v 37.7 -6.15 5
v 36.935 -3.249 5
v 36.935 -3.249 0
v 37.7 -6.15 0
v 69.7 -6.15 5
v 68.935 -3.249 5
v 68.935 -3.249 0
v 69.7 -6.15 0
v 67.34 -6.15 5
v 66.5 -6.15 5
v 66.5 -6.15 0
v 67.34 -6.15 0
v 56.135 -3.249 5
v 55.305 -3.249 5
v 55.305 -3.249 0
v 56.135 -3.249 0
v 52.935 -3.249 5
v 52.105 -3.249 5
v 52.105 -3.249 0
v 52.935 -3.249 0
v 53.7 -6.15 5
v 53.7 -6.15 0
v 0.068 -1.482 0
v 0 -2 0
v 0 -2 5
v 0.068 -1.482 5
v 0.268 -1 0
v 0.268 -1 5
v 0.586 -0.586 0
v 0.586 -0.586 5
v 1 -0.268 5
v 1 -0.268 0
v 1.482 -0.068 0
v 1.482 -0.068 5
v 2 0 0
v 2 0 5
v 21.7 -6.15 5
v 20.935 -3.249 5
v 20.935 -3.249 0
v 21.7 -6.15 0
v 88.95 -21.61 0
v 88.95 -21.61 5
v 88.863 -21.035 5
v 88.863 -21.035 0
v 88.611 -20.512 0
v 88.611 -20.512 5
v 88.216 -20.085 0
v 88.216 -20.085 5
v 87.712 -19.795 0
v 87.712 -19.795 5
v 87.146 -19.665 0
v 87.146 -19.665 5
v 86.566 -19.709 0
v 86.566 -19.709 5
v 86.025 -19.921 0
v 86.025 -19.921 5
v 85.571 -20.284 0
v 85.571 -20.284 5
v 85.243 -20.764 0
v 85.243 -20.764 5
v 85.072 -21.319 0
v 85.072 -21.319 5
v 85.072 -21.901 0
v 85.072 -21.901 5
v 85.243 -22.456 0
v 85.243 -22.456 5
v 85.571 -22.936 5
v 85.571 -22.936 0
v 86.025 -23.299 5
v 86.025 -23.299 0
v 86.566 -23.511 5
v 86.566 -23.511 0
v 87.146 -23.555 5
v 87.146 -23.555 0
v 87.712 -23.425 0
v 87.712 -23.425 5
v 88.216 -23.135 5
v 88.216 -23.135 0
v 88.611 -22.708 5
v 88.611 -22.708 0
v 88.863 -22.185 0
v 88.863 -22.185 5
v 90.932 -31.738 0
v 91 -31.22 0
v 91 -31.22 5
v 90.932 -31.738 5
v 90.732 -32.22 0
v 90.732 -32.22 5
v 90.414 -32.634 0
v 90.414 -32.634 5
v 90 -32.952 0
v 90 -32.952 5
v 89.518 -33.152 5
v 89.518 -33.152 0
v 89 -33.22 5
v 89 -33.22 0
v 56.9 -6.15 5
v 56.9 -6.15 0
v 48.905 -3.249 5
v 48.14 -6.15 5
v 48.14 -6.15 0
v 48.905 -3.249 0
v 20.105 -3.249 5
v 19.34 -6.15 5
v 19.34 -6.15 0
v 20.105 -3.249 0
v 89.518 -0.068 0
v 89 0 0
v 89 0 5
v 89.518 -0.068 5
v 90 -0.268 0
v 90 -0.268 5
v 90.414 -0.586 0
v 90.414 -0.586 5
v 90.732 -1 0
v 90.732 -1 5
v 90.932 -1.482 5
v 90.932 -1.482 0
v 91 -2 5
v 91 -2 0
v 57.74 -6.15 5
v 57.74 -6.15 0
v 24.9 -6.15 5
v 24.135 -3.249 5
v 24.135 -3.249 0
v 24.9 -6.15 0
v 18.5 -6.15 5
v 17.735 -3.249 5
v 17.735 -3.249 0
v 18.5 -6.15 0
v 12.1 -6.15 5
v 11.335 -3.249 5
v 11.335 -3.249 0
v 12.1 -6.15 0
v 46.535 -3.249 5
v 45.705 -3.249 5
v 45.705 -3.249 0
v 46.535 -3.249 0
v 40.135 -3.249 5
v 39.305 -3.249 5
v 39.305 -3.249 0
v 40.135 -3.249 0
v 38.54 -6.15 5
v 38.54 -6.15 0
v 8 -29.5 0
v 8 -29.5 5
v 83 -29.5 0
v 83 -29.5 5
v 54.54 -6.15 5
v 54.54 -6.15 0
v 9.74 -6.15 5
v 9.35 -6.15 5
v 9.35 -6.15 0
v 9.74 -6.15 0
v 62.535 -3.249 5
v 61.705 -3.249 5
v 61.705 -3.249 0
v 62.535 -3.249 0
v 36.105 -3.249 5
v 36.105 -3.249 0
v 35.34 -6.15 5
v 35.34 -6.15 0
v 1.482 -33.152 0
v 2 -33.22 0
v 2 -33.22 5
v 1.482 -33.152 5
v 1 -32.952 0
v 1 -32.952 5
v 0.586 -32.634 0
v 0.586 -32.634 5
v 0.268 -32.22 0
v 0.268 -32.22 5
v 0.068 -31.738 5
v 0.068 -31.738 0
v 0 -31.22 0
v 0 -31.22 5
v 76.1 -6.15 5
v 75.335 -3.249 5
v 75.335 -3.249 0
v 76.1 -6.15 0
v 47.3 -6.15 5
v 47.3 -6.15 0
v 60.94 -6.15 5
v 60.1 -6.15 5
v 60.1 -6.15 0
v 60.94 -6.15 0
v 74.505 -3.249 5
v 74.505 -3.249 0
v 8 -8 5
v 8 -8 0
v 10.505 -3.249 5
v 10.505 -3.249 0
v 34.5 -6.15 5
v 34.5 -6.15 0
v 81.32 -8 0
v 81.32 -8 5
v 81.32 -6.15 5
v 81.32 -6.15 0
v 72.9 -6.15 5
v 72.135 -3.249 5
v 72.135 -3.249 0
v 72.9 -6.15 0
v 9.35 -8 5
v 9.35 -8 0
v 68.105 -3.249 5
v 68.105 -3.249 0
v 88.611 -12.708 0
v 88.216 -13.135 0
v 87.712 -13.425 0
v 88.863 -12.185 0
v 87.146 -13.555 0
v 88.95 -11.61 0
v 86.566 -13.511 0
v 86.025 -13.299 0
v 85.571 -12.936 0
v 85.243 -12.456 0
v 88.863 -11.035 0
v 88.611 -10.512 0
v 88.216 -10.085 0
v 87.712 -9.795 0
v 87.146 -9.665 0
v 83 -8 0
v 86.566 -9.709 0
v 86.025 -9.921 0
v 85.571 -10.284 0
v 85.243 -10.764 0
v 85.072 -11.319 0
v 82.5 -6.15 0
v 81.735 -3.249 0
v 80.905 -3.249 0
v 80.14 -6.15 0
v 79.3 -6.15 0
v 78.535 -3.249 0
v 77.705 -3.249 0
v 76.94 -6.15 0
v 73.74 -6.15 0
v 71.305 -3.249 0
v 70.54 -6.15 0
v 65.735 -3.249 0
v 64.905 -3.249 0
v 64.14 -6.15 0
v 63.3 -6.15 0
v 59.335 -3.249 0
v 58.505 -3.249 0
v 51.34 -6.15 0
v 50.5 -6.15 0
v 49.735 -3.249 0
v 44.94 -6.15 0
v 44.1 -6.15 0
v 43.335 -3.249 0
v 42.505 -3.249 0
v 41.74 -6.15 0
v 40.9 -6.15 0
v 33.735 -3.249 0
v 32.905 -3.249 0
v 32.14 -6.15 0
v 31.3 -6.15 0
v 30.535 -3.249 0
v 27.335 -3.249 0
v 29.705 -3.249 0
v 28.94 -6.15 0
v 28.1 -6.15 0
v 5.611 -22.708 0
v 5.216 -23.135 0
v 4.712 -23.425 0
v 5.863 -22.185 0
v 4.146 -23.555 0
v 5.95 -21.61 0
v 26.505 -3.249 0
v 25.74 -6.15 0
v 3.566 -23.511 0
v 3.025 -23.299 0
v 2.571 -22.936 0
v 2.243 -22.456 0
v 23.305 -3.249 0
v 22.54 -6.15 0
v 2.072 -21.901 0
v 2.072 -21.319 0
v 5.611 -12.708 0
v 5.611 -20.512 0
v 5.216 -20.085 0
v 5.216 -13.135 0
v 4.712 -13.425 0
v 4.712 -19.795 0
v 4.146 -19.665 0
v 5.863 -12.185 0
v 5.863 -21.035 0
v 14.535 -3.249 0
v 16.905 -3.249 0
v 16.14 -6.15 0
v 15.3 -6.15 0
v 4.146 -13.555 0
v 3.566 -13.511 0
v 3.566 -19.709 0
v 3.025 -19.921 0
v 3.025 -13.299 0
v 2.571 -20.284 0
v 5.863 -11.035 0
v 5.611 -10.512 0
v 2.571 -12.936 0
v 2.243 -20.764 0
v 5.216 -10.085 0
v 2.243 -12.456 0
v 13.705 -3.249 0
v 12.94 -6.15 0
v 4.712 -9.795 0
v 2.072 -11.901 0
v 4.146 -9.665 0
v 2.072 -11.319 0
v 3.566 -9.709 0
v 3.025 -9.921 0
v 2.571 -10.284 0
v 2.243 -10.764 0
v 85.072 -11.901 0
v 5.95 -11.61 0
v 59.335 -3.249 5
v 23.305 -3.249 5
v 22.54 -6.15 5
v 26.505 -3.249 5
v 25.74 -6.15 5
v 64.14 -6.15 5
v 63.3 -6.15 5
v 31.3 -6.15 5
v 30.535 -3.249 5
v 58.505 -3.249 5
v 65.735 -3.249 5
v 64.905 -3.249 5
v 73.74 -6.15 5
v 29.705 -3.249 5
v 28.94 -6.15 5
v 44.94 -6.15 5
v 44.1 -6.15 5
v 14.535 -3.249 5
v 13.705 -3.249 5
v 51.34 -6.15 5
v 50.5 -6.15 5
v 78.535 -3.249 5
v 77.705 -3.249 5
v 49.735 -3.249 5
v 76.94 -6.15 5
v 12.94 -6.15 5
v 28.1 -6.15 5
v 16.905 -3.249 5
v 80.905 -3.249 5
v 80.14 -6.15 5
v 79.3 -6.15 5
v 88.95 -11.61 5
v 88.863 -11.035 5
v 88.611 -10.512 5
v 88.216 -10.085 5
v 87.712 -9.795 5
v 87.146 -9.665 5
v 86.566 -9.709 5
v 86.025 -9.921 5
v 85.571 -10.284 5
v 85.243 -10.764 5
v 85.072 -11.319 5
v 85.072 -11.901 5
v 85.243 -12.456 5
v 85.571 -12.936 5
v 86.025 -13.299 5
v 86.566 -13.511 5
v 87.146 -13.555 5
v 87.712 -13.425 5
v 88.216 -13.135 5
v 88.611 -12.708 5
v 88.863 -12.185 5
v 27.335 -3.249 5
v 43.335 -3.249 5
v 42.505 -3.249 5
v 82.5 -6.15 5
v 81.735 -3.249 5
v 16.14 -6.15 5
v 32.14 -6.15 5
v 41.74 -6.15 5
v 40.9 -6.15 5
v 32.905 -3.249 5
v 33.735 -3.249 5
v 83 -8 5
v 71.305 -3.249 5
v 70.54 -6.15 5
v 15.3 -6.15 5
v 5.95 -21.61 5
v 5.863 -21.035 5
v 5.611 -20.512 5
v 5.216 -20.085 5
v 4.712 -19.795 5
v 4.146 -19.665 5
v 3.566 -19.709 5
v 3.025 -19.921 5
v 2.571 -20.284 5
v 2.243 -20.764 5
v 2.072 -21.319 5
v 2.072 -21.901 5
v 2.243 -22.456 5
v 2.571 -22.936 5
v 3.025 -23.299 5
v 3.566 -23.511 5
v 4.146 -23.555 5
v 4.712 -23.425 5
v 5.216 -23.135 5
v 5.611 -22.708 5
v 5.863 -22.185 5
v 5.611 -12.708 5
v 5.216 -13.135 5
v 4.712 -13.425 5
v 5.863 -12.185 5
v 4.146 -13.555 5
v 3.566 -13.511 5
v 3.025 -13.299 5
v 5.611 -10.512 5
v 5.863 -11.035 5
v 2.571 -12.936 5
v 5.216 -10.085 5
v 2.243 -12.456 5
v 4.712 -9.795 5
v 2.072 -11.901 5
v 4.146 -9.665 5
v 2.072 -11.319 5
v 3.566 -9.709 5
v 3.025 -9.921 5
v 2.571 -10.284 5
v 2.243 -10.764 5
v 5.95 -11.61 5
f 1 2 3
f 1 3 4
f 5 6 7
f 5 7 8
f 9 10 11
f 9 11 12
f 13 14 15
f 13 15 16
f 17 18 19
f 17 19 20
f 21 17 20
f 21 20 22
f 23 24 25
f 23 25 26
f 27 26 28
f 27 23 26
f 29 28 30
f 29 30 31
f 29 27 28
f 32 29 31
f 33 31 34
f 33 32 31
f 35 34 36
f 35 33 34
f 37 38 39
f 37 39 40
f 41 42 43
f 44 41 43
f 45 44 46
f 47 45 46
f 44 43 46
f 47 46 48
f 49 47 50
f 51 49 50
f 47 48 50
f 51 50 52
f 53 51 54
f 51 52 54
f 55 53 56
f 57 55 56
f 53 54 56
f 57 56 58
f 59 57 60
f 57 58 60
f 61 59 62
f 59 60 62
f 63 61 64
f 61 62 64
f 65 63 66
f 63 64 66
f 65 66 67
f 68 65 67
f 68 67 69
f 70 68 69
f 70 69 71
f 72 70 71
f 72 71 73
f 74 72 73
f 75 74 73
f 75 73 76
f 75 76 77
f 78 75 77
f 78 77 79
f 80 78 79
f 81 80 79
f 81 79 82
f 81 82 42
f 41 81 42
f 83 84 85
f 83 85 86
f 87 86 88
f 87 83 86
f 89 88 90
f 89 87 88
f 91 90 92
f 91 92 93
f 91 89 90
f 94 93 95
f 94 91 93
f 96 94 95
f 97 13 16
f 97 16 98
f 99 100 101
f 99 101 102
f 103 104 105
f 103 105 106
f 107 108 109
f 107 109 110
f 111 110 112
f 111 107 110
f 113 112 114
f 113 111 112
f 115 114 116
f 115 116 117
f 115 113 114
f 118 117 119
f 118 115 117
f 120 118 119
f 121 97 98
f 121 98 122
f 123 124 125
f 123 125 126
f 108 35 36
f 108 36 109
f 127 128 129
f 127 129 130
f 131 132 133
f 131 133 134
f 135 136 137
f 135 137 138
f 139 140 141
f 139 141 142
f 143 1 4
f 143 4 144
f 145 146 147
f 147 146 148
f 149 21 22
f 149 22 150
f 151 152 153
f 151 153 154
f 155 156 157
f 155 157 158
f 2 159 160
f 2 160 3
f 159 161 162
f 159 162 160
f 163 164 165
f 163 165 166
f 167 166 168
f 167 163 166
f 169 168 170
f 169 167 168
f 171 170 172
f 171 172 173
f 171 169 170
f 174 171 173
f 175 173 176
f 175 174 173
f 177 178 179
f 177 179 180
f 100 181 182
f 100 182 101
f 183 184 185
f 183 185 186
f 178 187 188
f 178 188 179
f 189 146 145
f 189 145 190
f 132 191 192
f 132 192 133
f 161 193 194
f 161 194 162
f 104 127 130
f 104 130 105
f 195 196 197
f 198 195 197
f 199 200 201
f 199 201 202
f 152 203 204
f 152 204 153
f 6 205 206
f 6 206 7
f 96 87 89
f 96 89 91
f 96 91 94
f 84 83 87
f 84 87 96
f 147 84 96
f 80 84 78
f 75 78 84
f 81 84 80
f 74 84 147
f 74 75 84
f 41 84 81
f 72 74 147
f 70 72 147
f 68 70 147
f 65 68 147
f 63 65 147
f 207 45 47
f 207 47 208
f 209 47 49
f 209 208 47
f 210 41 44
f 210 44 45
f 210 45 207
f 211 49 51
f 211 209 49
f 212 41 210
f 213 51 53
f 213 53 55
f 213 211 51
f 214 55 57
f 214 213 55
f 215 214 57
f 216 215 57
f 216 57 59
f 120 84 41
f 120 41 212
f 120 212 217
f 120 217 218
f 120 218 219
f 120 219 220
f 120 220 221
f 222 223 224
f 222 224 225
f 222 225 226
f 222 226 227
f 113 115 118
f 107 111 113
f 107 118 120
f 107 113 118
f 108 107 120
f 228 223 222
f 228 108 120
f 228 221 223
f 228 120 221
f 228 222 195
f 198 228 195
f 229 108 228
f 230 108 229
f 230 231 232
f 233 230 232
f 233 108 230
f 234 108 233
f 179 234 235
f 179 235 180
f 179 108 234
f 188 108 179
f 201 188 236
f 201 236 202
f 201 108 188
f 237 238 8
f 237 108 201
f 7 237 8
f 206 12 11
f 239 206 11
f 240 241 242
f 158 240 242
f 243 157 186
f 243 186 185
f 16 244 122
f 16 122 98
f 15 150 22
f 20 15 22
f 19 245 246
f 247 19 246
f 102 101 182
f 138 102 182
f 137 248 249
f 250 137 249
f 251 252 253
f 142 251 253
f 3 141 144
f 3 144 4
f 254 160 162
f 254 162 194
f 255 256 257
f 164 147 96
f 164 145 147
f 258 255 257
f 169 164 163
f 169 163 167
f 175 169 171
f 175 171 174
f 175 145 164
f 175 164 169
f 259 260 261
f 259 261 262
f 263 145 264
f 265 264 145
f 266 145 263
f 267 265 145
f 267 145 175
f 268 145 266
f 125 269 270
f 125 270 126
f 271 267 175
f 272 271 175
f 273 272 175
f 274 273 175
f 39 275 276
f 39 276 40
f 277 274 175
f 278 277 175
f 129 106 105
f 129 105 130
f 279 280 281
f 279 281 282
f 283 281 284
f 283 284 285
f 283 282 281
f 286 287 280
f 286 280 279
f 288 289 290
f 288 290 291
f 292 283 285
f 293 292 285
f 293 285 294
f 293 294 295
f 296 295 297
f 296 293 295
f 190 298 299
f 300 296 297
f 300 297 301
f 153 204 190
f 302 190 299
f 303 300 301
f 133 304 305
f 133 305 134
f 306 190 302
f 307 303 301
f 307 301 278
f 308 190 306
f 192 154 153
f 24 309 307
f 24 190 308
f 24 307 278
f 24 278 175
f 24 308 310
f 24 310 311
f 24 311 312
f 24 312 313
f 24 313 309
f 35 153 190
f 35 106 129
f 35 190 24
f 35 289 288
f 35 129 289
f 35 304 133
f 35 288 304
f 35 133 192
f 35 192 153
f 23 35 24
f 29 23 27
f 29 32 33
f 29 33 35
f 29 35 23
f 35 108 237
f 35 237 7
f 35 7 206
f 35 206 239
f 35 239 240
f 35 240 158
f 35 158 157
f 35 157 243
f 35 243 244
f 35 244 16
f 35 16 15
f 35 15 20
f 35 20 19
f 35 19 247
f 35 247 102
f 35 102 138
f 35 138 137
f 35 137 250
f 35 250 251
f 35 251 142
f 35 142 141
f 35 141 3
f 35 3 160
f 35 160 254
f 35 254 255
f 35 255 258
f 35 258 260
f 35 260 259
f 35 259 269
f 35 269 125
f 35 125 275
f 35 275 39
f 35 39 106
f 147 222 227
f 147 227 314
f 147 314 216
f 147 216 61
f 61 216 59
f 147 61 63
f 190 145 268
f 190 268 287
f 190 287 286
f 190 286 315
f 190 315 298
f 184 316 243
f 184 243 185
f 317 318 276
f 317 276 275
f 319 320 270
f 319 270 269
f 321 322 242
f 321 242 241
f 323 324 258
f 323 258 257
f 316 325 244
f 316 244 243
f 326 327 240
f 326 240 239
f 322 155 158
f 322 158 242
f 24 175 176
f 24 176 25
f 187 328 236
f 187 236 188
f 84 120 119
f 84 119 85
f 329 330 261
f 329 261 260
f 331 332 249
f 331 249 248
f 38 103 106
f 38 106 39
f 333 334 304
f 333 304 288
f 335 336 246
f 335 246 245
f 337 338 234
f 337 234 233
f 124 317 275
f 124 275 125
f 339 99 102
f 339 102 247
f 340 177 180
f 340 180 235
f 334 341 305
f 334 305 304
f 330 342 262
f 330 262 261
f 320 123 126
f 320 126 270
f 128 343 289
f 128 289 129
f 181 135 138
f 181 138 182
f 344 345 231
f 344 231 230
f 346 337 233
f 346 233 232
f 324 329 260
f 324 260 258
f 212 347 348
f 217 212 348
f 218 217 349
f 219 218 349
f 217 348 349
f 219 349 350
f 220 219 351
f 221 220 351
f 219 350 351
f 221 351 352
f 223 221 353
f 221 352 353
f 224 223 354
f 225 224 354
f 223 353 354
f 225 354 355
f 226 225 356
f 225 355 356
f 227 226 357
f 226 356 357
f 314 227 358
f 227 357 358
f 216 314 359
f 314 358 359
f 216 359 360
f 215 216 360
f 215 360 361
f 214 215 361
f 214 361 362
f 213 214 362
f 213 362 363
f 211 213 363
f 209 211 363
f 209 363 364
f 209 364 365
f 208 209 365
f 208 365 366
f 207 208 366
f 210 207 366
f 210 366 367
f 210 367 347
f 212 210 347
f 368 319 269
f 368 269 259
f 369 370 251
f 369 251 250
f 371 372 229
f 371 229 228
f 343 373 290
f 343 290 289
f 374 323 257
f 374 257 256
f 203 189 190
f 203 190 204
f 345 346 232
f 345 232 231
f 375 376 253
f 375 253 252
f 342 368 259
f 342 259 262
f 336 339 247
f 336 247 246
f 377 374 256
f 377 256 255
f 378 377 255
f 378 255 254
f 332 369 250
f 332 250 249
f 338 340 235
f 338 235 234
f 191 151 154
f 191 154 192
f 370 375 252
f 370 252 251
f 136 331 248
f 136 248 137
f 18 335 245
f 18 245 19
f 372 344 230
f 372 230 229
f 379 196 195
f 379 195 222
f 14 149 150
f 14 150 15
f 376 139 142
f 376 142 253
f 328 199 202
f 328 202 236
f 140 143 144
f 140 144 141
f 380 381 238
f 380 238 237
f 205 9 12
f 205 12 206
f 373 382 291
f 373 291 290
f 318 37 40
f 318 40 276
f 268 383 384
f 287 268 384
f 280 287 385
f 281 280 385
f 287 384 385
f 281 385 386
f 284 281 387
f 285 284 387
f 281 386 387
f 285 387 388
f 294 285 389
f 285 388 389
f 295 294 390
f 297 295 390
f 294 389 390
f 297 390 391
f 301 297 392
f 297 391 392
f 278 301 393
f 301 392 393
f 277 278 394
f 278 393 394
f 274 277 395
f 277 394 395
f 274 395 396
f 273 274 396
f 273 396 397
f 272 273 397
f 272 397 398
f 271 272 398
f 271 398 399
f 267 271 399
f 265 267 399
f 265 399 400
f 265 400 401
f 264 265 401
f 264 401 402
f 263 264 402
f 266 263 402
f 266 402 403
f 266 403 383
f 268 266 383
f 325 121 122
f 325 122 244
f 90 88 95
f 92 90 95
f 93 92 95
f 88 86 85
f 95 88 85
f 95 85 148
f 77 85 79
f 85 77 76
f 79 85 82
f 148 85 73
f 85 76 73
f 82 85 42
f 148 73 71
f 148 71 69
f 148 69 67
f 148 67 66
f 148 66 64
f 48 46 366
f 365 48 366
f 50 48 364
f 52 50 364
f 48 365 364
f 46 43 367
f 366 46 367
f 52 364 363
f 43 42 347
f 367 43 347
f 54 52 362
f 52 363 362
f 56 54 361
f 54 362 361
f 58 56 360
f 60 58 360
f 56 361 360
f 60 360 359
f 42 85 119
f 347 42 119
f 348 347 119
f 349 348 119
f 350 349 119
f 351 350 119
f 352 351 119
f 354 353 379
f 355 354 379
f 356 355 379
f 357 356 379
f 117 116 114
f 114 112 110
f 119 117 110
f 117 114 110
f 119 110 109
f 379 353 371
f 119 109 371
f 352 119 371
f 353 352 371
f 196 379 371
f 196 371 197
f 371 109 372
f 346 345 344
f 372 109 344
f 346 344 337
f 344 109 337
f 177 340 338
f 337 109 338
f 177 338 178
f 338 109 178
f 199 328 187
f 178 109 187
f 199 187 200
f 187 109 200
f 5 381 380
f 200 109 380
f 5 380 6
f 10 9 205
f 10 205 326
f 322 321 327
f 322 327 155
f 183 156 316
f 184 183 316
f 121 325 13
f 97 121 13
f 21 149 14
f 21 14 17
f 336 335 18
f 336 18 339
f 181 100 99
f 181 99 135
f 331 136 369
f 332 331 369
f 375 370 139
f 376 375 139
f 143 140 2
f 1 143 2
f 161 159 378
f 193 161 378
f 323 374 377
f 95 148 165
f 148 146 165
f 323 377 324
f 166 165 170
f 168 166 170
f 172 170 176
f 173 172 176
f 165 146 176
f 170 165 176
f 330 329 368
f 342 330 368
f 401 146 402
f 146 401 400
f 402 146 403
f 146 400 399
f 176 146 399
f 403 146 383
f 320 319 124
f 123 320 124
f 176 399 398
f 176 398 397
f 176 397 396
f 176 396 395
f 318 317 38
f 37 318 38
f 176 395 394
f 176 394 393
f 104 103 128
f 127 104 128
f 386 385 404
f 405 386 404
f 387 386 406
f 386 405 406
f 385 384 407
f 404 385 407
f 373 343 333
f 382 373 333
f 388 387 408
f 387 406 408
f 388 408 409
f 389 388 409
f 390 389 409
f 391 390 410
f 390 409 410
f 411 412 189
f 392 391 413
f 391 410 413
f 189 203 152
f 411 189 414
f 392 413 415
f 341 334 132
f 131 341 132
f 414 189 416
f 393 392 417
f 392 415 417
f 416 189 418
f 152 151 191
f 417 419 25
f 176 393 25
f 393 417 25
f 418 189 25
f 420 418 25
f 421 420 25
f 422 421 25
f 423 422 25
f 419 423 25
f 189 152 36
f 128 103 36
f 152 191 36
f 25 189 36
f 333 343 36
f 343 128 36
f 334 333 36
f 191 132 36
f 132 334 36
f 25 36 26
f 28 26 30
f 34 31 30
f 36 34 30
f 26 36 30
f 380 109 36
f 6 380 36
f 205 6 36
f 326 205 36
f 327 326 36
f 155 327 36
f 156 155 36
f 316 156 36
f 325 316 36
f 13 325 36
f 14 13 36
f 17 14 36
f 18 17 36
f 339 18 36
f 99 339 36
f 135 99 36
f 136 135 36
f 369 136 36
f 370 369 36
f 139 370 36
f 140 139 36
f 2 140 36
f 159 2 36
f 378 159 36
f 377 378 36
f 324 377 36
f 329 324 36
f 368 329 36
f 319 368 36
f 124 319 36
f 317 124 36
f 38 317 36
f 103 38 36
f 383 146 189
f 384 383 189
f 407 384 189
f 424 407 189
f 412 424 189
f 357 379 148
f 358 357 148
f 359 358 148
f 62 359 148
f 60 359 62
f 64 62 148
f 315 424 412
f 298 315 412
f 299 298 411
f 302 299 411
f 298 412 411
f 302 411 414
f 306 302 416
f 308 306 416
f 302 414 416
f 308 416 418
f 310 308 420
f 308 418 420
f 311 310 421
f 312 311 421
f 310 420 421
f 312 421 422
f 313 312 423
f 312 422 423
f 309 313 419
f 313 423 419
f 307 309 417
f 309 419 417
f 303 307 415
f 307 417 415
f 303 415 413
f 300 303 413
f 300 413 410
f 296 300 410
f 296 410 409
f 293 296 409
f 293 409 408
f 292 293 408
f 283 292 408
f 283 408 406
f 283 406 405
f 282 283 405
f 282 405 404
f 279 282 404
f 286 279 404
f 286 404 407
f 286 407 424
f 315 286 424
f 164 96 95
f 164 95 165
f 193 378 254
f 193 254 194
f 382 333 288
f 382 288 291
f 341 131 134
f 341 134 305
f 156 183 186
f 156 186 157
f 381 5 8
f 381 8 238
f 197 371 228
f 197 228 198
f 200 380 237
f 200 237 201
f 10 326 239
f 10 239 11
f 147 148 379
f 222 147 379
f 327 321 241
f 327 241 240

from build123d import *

# Parameters (mm, degrees)
BOSS_EXTRUDE1_DEPTH = 5
SKETCH2_W           = 75
SKETCH2_H           = 21.5
CUT_EXTRUDE1_DEPTH  = 6
SKETCH3_W           = 71.97
SKETCH3_H           = 1.85
CUT_EXTRUDE2_DEPTH  = 6
CUT_EXTRUDE4_DEPTH  = 6
LPATTERN1_COUNT     = 23
LPATTERN1_PITCH     = 3.2
SKETCH5_R           = 1.95
CUT_EXTRUDE5_DEPTH  = 10


with BuildPart() as part:
    # Sketch1 → Boss-Extrude1 (new body)
    with BuildSketch(Plane.XY):
        with BuildLine():
            Line((2, 0), (89, 0))
            ThreePointArc((89, 0), (90.414213562, -0.585786438), (91, -2))
            Line((91, -2), (91, -31.22))
            ThreePointArc((91, -31.22), (90.414213562, -32.634213562), (89, -33.22))
            Line((89, -33.22), (2, -33.22))
            ThreePointArc((2, -33.22), (0.585786438, -32.634213562), (0, -31.22))
            Line((0, -31.22), (0, -2))
            ThreePointArc((0, -2), (0.585786438, -0.585786438), (2, 0))
        make_face()
    extrude(amount=BOSS_EXTRUDE1_DEPTH)

    # Sketch2 → Cut-Extrude1 (cut, through all)
    with BuildSketch(Plane.XY.offset(5)):
        with Locations((45.5, -18.75)):
            Rectangle(SKETCH2_W, SKETCH2_H)
    extrude(amount=-CUT_EXTRUDE1_DEPTH, mode=Mode.SUBTRACT)

    # Sketch3 → Cut-Extrude2 (cut, through all)
    with BuildSketch(Plane.XY.offset(5)):
        with Locations((45.335, -7.075)):
            Rectangle(SKETCH3_W, SKETCH3_H)
    extrude(amount=-CUT_EXTRUDE2_DEPTH, mode=Mode.SUBTRACT)

    # Sketch4 → Cut-Extrude4 (cut, through all)
    with BuildSketch(Plane.XY.offset(5)):
        Polygon((81.735, -3.249176841), (82.5, -6.15), (80.14, -6.15), (80.905, -3.249176841), align=None)
    cut_extrude4 = extrude(amount=-CUT_EXTRUDE4_DEPTH, mode=Mode.SUBTRACT)

    # LPattern1: Cut-Extrude4 ×23
    with Locations(*[(-i * LPATTERN1_PITCH, 0, 0) for i in range(1, LPATTERN1_COUNT)]):
        add(cut_extrude4, mode=Mode.SUBTRACT)

    # Sketch5 → Cut-Extrude5 (cut)
    with BuildSketch(Plane.XY.offset(5)):
        with Locations((4, -11.61)):
            Circle(SKETCH5_R)
        with Locations((4, -21.61)):
            Circle(SKETCH5_R)
        with Locations((87, -11.61)):
            Circle(SKETCH5_R)
        with Locations((87, -21.61)):
            Circle(SKETCH5_R)
    extrude(amount=-CUT_EXTRUDE5_DEPTH, mode=Mode.SUBTRACT)


solid = part.part
